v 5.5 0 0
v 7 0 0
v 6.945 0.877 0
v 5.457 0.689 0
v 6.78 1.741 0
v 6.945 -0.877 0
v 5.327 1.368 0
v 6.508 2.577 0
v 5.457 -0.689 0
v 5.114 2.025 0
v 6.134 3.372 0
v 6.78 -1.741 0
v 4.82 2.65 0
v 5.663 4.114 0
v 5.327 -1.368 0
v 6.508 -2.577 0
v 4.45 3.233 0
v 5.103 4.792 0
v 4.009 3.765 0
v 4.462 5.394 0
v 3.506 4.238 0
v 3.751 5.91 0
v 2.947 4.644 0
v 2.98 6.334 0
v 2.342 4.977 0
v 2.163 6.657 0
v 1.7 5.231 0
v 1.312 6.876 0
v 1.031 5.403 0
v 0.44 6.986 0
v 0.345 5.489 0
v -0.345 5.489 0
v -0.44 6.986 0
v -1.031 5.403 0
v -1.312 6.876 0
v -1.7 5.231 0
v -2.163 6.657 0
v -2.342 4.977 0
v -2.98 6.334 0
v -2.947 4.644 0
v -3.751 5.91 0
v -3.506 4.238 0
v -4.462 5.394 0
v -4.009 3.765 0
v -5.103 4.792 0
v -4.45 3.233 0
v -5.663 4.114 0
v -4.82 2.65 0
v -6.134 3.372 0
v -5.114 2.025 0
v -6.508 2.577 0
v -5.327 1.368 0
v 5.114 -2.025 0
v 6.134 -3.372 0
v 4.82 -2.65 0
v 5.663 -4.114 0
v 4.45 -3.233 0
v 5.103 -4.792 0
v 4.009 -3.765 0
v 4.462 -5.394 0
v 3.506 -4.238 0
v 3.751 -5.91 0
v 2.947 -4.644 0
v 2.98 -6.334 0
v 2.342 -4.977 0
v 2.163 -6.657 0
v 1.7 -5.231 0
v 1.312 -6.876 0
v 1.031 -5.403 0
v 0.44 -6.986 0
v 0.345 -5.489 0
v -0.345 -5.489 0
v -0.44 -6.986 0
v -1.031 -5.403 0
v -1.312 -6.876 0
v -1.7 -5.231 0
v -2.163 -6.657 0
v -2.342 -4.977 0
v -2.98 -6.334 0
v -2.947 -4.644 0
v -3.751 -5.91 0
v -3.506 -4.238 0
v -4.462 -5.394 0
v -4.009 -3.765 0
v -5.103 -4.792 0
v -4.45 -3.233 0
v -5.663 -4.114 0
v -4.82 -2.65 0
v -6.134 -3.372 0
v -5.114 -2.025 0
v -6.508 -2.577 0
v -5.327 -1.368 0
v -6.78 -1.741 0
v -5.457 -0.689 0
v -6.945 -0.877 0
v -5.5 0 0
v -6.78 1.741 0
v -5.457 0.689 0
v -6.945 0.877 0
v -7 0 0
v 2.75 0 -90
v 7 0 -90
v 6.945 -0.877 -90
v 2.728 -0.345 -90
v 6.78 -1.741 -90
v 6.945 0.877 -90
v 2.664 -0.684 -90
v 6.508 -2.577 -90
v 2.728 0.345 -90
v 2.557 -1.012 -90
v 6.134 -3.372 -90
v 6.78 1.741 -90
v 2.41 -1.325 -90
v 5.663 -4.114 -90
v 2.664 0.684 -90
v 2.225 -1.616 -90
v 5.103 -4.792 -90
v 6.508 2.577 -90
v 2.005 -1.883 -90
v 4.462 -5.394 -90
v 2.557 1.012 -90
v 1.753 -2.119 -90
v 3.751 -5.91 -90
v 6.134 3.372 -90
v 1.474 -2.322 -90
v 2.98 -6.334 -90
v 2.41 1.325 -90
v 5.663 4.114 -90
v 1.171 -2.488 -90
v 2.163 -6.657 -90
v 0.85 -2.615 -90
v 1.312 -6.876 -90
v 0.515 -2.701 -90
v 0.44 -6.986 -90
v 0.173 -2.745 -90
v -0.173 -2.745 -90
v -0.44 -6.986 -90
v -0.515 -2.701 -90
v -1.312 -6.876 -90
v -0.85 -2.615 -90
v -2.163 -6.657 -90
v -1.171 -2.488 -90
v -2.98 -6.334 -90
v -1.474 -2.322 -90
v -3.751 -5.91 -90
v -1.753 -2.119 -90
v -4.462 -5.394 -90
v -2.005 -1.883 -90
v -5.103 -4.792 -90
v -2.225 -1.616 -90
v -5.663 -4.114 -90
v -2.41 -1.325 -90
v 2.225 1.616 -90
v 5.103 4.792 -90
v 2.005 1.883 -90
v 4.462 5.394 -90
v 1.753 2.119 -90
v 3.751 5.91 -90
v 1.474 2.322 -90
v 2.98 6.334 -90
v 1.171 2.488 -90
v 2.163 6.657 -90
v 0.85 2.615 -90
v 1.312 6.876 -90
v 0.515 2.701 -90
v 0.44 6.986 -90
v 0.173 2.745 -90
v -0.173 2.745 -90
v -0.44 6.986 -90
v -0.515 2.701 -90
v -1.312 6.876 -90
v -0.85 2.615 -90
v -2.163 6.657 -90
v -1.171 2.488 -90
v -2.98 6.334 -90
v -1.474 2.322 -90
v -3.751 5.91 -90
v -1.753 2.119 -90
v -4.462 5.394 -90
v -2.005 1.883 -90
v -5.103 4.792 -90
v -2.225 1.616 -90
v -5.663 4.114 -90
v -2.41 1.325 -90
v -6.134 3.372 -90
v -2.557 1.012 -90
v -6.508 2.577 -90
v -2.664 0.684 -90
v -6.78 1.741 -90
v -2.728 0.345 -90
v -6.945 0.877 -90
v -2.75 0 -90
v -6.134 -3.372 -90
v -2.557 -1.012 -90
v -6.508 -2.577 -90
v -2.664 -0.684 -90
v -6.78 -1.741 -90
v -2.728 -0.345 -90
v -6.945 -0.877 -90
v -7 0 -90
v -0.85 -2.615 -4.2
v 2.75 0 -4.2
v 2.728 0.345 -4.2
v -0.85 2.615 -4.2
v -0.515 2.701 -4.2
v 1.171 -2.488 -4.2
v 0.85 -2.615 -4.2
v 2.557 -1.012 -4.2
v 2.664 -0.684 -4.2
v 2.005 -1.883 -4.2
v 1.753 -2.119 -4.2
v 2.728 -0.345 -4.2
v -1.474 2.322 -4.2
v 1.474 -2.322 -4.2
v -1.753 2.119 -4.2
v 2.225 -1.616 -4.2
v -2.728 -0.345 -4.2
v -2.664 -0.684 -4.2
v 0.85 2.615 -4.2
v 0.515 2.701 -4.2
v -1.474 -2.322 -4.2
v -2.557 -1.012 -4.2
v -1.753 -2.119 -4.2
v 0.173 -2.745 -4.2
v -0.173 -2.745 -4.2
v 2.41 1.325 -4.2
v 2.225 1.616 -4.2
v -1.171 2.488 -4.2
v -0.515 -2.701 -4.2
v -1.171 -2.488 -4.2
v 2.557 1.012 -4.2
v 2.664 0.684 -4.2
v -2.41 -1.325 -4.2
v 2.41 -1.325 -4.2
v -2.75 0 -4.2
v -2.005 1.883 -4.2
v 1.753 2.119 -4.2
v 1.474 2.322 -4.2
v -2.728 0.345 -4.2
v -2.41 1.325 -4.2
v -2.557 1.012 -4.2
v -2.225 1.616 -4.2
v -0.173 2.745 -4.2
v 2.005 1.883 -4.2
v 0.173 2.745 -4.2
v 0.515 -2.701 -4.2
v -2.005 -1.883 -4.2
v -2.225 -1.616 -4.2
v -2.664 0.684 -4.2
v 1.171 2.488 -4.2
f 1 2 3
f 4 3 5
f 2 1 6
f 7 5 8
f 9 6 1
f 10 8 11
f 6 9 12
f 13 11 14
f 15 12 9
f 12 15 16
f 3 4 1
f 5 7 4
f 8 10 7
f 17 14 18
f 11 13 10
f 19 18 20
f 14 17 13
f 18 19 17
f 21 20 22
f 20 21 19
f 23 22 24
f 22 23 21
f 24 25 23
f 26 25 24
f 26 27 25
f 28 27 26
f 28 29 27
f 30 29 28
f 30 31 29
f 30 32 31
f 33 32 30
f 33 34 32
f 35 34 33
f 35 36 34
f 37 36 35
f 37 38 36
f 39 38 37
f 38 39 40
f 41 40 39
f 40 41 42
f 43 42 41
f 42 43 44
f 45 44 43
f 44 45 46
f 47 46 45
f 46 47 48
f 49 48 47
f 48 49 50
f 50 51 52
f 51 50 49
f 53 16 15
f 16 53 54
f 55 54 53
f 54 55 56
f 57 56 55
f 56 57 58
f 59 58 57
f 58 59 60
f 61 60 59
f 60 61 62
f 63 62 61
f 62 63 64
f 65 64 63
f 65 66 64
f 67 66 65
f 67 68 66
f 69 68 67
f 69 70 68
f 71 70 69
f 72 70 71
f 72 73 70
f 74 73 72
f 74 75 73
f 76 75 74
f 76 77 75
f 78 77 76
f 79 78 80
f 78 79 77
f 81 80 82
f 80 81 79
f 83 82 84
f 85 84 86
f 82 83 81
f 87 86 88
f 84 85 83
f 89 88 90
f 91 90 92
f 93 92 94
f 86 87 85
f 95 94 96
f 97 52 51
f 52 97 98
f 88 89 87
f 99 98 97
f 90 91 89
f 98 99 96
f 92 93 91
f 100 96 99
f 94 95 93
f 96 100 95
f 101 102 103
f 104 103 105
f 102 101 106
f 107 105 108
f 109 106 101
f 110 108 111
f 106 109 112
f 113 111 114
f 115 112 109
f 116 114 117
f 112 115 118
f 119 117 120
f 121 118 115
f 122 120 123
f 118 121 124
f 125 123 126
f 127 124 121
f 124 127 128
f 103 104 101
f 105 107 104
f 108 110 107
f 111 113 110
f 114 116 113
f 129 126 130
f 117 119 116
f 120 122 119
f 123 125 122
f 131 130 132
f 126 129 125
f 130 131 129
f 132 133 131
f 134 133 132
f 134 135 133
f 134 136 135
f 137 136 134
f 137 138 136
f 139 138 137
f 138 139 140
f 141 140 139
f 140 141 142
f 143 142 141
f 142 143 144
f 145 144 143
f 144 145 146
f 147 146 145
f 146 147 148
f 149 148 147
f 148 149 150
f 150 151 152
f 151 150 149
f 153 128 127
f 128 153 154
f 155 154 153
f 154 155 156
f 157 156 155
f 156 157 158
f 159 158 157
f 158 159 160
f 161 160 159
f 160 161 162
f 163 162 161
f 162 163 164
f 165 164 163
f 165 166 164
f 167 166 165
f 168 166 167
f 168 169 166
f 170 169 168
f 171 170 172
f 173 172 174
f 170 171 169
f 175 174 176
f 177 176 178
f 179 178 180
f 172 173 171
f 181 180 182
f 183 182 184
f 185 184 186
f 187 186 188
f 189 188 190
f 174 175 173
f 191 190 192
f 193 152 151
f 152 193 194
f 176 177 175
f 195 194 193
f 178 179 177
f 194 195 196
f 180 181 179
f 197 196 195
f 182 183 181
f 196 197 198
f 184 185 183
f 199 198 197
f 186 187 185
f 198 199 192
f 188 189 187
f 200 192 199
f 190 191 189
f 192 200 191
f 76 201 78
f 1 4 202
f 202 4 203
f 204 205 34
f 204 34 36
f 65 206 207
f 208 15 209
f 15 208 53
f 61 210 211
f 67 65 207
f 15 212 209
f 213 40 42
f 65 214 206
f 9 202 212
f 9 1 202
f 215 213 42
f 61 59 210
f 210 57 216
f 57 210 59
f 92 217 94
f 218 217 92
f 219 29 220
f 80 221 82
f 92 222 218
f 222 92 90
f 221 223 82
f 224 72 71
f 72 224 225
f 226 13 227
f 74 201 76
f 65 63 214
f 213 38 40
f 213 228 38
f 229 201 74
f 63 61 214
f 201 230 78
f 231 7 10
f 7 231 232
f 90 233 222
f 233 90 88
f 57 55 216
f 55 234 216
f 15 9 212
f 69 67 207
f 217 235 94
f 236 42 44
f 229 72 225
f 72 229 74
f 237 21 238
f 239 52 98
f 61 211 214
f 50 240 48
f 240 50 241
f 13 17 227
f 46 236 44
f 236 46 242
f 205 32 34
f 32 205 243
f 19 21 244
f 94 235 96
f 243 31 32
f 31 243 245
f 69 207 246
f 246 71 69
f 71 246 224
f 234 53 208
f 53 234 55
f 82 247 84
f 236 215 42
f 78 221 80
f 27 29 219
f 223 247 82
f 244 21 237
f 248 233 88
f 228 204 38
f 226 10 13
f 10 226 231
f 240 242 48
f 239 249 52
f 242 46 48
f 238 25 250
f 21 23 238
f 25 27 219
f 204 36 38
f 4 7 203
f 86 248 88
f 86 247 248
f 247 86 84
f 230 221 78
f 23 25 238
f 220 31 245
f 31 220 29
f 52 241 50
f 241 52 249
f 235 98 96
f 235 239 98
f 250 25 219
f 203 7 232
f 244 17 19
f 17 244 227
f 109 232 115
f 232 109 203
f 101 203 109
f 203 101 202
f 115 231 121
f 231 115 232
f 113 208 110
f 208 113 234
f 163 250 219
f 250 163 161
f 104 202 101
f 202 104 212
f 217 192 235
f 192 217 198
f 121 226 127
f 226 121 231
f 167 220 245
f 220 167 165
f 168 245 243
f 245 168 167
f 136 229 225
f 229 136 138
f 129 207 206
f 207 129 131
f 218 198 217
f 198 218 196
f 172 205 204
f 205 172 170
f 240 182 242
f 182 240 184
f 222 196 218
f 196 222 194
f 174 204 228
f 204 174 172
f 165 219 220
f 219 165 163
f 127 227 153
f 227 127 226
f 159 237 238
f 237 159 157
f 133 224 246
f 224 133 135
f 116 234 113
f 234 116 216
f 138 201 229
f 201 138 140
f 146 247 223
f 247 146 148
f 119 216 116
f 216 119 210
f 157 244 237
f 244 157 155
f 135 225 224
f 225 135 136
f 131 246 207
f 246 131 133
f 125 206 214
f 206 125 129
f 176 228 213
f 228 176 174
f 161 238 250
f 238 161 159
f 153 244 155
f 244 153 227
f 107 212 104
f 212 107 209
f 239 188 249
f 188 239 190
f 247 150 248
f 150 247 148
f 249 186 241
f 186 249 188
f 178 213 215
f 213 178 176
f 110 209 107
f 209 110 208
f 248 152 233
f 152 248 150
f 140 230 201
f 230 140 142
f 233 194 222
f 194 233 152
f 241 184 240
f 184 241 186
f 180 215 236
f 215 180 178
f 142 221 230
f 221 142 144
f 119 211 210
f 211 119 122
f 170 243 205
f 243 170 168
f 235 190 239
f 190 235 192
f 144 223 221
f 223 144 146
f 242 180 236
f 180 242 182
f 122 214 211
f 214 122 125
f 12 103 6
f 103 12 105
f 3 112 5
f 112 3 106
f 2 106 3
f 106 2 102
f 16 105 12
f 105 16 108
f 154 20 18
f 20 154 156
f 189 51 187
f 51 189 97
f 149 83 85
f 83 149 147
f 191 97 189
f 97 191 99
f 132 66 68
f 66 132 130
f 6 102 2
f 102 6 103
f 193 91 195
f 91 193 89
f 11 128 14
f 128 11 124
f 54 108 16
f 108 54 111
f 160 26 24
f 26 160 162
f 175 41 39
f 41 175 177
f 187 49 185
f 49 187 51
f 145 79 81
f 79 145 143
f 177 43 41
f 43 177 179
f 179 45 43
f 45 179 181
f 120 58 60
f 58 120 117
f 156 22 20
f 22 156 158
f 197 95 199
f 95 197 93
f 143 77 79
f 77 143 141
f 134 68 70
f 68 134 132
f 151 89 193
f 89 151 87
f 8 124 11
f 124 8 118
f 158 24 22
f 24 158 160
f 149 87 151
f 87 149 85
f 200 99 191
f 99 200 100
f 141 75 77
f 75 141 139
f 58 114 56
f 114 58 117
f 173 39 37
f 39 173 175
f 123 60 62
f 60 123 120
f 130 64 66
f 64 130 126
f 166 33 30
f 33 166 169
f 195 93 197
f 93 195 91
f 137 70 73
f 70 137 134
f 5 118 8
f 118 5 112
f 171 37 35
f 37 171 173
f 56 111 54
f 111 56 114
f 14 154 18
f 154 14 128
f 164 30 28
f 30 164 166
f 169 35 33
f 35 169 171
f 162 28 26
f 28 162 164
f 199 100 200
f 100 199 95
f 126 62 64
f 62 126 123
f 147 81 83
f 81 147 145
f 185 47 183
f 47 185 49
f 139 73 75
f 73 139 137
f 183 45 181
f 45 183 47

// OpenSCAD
$fn = 50;


difference() {
	union() {
		translate(v = [0, 0, -90.0000000000]) {
			cylinder(h = 90, r = 7.0000000000);
		}
		cylinder(h = 0, r = 17.0000000000);
	}
	union() {
		translate(v = [0, 0, 0]) {
			rotate(a = [0, 0, 0]) {
				difference() {
					union() {
						#translate(v = [0, 0, -90.0000000000]) {
							cylinder(h = 90, r = 2.2500000000);
						}
						#translate(v = [0, 0, -4.2000000000]) {
							cylinder(h = 4.2000000000, r = 7.0000000000, r1 = 2.7500000000, r2 = 5.5000000000);
						}
						#translate(v = [0, 0, -90.0000000000]) {
							cylinder(h = 90, r = 2.7500000000);
						}
						#translate(v = [0, 0, -90.0000000000]) {
							cylinder(h = 90, r = 2.2500000000);
						}
					}
					union();
				}
			}
		}
	}
}
